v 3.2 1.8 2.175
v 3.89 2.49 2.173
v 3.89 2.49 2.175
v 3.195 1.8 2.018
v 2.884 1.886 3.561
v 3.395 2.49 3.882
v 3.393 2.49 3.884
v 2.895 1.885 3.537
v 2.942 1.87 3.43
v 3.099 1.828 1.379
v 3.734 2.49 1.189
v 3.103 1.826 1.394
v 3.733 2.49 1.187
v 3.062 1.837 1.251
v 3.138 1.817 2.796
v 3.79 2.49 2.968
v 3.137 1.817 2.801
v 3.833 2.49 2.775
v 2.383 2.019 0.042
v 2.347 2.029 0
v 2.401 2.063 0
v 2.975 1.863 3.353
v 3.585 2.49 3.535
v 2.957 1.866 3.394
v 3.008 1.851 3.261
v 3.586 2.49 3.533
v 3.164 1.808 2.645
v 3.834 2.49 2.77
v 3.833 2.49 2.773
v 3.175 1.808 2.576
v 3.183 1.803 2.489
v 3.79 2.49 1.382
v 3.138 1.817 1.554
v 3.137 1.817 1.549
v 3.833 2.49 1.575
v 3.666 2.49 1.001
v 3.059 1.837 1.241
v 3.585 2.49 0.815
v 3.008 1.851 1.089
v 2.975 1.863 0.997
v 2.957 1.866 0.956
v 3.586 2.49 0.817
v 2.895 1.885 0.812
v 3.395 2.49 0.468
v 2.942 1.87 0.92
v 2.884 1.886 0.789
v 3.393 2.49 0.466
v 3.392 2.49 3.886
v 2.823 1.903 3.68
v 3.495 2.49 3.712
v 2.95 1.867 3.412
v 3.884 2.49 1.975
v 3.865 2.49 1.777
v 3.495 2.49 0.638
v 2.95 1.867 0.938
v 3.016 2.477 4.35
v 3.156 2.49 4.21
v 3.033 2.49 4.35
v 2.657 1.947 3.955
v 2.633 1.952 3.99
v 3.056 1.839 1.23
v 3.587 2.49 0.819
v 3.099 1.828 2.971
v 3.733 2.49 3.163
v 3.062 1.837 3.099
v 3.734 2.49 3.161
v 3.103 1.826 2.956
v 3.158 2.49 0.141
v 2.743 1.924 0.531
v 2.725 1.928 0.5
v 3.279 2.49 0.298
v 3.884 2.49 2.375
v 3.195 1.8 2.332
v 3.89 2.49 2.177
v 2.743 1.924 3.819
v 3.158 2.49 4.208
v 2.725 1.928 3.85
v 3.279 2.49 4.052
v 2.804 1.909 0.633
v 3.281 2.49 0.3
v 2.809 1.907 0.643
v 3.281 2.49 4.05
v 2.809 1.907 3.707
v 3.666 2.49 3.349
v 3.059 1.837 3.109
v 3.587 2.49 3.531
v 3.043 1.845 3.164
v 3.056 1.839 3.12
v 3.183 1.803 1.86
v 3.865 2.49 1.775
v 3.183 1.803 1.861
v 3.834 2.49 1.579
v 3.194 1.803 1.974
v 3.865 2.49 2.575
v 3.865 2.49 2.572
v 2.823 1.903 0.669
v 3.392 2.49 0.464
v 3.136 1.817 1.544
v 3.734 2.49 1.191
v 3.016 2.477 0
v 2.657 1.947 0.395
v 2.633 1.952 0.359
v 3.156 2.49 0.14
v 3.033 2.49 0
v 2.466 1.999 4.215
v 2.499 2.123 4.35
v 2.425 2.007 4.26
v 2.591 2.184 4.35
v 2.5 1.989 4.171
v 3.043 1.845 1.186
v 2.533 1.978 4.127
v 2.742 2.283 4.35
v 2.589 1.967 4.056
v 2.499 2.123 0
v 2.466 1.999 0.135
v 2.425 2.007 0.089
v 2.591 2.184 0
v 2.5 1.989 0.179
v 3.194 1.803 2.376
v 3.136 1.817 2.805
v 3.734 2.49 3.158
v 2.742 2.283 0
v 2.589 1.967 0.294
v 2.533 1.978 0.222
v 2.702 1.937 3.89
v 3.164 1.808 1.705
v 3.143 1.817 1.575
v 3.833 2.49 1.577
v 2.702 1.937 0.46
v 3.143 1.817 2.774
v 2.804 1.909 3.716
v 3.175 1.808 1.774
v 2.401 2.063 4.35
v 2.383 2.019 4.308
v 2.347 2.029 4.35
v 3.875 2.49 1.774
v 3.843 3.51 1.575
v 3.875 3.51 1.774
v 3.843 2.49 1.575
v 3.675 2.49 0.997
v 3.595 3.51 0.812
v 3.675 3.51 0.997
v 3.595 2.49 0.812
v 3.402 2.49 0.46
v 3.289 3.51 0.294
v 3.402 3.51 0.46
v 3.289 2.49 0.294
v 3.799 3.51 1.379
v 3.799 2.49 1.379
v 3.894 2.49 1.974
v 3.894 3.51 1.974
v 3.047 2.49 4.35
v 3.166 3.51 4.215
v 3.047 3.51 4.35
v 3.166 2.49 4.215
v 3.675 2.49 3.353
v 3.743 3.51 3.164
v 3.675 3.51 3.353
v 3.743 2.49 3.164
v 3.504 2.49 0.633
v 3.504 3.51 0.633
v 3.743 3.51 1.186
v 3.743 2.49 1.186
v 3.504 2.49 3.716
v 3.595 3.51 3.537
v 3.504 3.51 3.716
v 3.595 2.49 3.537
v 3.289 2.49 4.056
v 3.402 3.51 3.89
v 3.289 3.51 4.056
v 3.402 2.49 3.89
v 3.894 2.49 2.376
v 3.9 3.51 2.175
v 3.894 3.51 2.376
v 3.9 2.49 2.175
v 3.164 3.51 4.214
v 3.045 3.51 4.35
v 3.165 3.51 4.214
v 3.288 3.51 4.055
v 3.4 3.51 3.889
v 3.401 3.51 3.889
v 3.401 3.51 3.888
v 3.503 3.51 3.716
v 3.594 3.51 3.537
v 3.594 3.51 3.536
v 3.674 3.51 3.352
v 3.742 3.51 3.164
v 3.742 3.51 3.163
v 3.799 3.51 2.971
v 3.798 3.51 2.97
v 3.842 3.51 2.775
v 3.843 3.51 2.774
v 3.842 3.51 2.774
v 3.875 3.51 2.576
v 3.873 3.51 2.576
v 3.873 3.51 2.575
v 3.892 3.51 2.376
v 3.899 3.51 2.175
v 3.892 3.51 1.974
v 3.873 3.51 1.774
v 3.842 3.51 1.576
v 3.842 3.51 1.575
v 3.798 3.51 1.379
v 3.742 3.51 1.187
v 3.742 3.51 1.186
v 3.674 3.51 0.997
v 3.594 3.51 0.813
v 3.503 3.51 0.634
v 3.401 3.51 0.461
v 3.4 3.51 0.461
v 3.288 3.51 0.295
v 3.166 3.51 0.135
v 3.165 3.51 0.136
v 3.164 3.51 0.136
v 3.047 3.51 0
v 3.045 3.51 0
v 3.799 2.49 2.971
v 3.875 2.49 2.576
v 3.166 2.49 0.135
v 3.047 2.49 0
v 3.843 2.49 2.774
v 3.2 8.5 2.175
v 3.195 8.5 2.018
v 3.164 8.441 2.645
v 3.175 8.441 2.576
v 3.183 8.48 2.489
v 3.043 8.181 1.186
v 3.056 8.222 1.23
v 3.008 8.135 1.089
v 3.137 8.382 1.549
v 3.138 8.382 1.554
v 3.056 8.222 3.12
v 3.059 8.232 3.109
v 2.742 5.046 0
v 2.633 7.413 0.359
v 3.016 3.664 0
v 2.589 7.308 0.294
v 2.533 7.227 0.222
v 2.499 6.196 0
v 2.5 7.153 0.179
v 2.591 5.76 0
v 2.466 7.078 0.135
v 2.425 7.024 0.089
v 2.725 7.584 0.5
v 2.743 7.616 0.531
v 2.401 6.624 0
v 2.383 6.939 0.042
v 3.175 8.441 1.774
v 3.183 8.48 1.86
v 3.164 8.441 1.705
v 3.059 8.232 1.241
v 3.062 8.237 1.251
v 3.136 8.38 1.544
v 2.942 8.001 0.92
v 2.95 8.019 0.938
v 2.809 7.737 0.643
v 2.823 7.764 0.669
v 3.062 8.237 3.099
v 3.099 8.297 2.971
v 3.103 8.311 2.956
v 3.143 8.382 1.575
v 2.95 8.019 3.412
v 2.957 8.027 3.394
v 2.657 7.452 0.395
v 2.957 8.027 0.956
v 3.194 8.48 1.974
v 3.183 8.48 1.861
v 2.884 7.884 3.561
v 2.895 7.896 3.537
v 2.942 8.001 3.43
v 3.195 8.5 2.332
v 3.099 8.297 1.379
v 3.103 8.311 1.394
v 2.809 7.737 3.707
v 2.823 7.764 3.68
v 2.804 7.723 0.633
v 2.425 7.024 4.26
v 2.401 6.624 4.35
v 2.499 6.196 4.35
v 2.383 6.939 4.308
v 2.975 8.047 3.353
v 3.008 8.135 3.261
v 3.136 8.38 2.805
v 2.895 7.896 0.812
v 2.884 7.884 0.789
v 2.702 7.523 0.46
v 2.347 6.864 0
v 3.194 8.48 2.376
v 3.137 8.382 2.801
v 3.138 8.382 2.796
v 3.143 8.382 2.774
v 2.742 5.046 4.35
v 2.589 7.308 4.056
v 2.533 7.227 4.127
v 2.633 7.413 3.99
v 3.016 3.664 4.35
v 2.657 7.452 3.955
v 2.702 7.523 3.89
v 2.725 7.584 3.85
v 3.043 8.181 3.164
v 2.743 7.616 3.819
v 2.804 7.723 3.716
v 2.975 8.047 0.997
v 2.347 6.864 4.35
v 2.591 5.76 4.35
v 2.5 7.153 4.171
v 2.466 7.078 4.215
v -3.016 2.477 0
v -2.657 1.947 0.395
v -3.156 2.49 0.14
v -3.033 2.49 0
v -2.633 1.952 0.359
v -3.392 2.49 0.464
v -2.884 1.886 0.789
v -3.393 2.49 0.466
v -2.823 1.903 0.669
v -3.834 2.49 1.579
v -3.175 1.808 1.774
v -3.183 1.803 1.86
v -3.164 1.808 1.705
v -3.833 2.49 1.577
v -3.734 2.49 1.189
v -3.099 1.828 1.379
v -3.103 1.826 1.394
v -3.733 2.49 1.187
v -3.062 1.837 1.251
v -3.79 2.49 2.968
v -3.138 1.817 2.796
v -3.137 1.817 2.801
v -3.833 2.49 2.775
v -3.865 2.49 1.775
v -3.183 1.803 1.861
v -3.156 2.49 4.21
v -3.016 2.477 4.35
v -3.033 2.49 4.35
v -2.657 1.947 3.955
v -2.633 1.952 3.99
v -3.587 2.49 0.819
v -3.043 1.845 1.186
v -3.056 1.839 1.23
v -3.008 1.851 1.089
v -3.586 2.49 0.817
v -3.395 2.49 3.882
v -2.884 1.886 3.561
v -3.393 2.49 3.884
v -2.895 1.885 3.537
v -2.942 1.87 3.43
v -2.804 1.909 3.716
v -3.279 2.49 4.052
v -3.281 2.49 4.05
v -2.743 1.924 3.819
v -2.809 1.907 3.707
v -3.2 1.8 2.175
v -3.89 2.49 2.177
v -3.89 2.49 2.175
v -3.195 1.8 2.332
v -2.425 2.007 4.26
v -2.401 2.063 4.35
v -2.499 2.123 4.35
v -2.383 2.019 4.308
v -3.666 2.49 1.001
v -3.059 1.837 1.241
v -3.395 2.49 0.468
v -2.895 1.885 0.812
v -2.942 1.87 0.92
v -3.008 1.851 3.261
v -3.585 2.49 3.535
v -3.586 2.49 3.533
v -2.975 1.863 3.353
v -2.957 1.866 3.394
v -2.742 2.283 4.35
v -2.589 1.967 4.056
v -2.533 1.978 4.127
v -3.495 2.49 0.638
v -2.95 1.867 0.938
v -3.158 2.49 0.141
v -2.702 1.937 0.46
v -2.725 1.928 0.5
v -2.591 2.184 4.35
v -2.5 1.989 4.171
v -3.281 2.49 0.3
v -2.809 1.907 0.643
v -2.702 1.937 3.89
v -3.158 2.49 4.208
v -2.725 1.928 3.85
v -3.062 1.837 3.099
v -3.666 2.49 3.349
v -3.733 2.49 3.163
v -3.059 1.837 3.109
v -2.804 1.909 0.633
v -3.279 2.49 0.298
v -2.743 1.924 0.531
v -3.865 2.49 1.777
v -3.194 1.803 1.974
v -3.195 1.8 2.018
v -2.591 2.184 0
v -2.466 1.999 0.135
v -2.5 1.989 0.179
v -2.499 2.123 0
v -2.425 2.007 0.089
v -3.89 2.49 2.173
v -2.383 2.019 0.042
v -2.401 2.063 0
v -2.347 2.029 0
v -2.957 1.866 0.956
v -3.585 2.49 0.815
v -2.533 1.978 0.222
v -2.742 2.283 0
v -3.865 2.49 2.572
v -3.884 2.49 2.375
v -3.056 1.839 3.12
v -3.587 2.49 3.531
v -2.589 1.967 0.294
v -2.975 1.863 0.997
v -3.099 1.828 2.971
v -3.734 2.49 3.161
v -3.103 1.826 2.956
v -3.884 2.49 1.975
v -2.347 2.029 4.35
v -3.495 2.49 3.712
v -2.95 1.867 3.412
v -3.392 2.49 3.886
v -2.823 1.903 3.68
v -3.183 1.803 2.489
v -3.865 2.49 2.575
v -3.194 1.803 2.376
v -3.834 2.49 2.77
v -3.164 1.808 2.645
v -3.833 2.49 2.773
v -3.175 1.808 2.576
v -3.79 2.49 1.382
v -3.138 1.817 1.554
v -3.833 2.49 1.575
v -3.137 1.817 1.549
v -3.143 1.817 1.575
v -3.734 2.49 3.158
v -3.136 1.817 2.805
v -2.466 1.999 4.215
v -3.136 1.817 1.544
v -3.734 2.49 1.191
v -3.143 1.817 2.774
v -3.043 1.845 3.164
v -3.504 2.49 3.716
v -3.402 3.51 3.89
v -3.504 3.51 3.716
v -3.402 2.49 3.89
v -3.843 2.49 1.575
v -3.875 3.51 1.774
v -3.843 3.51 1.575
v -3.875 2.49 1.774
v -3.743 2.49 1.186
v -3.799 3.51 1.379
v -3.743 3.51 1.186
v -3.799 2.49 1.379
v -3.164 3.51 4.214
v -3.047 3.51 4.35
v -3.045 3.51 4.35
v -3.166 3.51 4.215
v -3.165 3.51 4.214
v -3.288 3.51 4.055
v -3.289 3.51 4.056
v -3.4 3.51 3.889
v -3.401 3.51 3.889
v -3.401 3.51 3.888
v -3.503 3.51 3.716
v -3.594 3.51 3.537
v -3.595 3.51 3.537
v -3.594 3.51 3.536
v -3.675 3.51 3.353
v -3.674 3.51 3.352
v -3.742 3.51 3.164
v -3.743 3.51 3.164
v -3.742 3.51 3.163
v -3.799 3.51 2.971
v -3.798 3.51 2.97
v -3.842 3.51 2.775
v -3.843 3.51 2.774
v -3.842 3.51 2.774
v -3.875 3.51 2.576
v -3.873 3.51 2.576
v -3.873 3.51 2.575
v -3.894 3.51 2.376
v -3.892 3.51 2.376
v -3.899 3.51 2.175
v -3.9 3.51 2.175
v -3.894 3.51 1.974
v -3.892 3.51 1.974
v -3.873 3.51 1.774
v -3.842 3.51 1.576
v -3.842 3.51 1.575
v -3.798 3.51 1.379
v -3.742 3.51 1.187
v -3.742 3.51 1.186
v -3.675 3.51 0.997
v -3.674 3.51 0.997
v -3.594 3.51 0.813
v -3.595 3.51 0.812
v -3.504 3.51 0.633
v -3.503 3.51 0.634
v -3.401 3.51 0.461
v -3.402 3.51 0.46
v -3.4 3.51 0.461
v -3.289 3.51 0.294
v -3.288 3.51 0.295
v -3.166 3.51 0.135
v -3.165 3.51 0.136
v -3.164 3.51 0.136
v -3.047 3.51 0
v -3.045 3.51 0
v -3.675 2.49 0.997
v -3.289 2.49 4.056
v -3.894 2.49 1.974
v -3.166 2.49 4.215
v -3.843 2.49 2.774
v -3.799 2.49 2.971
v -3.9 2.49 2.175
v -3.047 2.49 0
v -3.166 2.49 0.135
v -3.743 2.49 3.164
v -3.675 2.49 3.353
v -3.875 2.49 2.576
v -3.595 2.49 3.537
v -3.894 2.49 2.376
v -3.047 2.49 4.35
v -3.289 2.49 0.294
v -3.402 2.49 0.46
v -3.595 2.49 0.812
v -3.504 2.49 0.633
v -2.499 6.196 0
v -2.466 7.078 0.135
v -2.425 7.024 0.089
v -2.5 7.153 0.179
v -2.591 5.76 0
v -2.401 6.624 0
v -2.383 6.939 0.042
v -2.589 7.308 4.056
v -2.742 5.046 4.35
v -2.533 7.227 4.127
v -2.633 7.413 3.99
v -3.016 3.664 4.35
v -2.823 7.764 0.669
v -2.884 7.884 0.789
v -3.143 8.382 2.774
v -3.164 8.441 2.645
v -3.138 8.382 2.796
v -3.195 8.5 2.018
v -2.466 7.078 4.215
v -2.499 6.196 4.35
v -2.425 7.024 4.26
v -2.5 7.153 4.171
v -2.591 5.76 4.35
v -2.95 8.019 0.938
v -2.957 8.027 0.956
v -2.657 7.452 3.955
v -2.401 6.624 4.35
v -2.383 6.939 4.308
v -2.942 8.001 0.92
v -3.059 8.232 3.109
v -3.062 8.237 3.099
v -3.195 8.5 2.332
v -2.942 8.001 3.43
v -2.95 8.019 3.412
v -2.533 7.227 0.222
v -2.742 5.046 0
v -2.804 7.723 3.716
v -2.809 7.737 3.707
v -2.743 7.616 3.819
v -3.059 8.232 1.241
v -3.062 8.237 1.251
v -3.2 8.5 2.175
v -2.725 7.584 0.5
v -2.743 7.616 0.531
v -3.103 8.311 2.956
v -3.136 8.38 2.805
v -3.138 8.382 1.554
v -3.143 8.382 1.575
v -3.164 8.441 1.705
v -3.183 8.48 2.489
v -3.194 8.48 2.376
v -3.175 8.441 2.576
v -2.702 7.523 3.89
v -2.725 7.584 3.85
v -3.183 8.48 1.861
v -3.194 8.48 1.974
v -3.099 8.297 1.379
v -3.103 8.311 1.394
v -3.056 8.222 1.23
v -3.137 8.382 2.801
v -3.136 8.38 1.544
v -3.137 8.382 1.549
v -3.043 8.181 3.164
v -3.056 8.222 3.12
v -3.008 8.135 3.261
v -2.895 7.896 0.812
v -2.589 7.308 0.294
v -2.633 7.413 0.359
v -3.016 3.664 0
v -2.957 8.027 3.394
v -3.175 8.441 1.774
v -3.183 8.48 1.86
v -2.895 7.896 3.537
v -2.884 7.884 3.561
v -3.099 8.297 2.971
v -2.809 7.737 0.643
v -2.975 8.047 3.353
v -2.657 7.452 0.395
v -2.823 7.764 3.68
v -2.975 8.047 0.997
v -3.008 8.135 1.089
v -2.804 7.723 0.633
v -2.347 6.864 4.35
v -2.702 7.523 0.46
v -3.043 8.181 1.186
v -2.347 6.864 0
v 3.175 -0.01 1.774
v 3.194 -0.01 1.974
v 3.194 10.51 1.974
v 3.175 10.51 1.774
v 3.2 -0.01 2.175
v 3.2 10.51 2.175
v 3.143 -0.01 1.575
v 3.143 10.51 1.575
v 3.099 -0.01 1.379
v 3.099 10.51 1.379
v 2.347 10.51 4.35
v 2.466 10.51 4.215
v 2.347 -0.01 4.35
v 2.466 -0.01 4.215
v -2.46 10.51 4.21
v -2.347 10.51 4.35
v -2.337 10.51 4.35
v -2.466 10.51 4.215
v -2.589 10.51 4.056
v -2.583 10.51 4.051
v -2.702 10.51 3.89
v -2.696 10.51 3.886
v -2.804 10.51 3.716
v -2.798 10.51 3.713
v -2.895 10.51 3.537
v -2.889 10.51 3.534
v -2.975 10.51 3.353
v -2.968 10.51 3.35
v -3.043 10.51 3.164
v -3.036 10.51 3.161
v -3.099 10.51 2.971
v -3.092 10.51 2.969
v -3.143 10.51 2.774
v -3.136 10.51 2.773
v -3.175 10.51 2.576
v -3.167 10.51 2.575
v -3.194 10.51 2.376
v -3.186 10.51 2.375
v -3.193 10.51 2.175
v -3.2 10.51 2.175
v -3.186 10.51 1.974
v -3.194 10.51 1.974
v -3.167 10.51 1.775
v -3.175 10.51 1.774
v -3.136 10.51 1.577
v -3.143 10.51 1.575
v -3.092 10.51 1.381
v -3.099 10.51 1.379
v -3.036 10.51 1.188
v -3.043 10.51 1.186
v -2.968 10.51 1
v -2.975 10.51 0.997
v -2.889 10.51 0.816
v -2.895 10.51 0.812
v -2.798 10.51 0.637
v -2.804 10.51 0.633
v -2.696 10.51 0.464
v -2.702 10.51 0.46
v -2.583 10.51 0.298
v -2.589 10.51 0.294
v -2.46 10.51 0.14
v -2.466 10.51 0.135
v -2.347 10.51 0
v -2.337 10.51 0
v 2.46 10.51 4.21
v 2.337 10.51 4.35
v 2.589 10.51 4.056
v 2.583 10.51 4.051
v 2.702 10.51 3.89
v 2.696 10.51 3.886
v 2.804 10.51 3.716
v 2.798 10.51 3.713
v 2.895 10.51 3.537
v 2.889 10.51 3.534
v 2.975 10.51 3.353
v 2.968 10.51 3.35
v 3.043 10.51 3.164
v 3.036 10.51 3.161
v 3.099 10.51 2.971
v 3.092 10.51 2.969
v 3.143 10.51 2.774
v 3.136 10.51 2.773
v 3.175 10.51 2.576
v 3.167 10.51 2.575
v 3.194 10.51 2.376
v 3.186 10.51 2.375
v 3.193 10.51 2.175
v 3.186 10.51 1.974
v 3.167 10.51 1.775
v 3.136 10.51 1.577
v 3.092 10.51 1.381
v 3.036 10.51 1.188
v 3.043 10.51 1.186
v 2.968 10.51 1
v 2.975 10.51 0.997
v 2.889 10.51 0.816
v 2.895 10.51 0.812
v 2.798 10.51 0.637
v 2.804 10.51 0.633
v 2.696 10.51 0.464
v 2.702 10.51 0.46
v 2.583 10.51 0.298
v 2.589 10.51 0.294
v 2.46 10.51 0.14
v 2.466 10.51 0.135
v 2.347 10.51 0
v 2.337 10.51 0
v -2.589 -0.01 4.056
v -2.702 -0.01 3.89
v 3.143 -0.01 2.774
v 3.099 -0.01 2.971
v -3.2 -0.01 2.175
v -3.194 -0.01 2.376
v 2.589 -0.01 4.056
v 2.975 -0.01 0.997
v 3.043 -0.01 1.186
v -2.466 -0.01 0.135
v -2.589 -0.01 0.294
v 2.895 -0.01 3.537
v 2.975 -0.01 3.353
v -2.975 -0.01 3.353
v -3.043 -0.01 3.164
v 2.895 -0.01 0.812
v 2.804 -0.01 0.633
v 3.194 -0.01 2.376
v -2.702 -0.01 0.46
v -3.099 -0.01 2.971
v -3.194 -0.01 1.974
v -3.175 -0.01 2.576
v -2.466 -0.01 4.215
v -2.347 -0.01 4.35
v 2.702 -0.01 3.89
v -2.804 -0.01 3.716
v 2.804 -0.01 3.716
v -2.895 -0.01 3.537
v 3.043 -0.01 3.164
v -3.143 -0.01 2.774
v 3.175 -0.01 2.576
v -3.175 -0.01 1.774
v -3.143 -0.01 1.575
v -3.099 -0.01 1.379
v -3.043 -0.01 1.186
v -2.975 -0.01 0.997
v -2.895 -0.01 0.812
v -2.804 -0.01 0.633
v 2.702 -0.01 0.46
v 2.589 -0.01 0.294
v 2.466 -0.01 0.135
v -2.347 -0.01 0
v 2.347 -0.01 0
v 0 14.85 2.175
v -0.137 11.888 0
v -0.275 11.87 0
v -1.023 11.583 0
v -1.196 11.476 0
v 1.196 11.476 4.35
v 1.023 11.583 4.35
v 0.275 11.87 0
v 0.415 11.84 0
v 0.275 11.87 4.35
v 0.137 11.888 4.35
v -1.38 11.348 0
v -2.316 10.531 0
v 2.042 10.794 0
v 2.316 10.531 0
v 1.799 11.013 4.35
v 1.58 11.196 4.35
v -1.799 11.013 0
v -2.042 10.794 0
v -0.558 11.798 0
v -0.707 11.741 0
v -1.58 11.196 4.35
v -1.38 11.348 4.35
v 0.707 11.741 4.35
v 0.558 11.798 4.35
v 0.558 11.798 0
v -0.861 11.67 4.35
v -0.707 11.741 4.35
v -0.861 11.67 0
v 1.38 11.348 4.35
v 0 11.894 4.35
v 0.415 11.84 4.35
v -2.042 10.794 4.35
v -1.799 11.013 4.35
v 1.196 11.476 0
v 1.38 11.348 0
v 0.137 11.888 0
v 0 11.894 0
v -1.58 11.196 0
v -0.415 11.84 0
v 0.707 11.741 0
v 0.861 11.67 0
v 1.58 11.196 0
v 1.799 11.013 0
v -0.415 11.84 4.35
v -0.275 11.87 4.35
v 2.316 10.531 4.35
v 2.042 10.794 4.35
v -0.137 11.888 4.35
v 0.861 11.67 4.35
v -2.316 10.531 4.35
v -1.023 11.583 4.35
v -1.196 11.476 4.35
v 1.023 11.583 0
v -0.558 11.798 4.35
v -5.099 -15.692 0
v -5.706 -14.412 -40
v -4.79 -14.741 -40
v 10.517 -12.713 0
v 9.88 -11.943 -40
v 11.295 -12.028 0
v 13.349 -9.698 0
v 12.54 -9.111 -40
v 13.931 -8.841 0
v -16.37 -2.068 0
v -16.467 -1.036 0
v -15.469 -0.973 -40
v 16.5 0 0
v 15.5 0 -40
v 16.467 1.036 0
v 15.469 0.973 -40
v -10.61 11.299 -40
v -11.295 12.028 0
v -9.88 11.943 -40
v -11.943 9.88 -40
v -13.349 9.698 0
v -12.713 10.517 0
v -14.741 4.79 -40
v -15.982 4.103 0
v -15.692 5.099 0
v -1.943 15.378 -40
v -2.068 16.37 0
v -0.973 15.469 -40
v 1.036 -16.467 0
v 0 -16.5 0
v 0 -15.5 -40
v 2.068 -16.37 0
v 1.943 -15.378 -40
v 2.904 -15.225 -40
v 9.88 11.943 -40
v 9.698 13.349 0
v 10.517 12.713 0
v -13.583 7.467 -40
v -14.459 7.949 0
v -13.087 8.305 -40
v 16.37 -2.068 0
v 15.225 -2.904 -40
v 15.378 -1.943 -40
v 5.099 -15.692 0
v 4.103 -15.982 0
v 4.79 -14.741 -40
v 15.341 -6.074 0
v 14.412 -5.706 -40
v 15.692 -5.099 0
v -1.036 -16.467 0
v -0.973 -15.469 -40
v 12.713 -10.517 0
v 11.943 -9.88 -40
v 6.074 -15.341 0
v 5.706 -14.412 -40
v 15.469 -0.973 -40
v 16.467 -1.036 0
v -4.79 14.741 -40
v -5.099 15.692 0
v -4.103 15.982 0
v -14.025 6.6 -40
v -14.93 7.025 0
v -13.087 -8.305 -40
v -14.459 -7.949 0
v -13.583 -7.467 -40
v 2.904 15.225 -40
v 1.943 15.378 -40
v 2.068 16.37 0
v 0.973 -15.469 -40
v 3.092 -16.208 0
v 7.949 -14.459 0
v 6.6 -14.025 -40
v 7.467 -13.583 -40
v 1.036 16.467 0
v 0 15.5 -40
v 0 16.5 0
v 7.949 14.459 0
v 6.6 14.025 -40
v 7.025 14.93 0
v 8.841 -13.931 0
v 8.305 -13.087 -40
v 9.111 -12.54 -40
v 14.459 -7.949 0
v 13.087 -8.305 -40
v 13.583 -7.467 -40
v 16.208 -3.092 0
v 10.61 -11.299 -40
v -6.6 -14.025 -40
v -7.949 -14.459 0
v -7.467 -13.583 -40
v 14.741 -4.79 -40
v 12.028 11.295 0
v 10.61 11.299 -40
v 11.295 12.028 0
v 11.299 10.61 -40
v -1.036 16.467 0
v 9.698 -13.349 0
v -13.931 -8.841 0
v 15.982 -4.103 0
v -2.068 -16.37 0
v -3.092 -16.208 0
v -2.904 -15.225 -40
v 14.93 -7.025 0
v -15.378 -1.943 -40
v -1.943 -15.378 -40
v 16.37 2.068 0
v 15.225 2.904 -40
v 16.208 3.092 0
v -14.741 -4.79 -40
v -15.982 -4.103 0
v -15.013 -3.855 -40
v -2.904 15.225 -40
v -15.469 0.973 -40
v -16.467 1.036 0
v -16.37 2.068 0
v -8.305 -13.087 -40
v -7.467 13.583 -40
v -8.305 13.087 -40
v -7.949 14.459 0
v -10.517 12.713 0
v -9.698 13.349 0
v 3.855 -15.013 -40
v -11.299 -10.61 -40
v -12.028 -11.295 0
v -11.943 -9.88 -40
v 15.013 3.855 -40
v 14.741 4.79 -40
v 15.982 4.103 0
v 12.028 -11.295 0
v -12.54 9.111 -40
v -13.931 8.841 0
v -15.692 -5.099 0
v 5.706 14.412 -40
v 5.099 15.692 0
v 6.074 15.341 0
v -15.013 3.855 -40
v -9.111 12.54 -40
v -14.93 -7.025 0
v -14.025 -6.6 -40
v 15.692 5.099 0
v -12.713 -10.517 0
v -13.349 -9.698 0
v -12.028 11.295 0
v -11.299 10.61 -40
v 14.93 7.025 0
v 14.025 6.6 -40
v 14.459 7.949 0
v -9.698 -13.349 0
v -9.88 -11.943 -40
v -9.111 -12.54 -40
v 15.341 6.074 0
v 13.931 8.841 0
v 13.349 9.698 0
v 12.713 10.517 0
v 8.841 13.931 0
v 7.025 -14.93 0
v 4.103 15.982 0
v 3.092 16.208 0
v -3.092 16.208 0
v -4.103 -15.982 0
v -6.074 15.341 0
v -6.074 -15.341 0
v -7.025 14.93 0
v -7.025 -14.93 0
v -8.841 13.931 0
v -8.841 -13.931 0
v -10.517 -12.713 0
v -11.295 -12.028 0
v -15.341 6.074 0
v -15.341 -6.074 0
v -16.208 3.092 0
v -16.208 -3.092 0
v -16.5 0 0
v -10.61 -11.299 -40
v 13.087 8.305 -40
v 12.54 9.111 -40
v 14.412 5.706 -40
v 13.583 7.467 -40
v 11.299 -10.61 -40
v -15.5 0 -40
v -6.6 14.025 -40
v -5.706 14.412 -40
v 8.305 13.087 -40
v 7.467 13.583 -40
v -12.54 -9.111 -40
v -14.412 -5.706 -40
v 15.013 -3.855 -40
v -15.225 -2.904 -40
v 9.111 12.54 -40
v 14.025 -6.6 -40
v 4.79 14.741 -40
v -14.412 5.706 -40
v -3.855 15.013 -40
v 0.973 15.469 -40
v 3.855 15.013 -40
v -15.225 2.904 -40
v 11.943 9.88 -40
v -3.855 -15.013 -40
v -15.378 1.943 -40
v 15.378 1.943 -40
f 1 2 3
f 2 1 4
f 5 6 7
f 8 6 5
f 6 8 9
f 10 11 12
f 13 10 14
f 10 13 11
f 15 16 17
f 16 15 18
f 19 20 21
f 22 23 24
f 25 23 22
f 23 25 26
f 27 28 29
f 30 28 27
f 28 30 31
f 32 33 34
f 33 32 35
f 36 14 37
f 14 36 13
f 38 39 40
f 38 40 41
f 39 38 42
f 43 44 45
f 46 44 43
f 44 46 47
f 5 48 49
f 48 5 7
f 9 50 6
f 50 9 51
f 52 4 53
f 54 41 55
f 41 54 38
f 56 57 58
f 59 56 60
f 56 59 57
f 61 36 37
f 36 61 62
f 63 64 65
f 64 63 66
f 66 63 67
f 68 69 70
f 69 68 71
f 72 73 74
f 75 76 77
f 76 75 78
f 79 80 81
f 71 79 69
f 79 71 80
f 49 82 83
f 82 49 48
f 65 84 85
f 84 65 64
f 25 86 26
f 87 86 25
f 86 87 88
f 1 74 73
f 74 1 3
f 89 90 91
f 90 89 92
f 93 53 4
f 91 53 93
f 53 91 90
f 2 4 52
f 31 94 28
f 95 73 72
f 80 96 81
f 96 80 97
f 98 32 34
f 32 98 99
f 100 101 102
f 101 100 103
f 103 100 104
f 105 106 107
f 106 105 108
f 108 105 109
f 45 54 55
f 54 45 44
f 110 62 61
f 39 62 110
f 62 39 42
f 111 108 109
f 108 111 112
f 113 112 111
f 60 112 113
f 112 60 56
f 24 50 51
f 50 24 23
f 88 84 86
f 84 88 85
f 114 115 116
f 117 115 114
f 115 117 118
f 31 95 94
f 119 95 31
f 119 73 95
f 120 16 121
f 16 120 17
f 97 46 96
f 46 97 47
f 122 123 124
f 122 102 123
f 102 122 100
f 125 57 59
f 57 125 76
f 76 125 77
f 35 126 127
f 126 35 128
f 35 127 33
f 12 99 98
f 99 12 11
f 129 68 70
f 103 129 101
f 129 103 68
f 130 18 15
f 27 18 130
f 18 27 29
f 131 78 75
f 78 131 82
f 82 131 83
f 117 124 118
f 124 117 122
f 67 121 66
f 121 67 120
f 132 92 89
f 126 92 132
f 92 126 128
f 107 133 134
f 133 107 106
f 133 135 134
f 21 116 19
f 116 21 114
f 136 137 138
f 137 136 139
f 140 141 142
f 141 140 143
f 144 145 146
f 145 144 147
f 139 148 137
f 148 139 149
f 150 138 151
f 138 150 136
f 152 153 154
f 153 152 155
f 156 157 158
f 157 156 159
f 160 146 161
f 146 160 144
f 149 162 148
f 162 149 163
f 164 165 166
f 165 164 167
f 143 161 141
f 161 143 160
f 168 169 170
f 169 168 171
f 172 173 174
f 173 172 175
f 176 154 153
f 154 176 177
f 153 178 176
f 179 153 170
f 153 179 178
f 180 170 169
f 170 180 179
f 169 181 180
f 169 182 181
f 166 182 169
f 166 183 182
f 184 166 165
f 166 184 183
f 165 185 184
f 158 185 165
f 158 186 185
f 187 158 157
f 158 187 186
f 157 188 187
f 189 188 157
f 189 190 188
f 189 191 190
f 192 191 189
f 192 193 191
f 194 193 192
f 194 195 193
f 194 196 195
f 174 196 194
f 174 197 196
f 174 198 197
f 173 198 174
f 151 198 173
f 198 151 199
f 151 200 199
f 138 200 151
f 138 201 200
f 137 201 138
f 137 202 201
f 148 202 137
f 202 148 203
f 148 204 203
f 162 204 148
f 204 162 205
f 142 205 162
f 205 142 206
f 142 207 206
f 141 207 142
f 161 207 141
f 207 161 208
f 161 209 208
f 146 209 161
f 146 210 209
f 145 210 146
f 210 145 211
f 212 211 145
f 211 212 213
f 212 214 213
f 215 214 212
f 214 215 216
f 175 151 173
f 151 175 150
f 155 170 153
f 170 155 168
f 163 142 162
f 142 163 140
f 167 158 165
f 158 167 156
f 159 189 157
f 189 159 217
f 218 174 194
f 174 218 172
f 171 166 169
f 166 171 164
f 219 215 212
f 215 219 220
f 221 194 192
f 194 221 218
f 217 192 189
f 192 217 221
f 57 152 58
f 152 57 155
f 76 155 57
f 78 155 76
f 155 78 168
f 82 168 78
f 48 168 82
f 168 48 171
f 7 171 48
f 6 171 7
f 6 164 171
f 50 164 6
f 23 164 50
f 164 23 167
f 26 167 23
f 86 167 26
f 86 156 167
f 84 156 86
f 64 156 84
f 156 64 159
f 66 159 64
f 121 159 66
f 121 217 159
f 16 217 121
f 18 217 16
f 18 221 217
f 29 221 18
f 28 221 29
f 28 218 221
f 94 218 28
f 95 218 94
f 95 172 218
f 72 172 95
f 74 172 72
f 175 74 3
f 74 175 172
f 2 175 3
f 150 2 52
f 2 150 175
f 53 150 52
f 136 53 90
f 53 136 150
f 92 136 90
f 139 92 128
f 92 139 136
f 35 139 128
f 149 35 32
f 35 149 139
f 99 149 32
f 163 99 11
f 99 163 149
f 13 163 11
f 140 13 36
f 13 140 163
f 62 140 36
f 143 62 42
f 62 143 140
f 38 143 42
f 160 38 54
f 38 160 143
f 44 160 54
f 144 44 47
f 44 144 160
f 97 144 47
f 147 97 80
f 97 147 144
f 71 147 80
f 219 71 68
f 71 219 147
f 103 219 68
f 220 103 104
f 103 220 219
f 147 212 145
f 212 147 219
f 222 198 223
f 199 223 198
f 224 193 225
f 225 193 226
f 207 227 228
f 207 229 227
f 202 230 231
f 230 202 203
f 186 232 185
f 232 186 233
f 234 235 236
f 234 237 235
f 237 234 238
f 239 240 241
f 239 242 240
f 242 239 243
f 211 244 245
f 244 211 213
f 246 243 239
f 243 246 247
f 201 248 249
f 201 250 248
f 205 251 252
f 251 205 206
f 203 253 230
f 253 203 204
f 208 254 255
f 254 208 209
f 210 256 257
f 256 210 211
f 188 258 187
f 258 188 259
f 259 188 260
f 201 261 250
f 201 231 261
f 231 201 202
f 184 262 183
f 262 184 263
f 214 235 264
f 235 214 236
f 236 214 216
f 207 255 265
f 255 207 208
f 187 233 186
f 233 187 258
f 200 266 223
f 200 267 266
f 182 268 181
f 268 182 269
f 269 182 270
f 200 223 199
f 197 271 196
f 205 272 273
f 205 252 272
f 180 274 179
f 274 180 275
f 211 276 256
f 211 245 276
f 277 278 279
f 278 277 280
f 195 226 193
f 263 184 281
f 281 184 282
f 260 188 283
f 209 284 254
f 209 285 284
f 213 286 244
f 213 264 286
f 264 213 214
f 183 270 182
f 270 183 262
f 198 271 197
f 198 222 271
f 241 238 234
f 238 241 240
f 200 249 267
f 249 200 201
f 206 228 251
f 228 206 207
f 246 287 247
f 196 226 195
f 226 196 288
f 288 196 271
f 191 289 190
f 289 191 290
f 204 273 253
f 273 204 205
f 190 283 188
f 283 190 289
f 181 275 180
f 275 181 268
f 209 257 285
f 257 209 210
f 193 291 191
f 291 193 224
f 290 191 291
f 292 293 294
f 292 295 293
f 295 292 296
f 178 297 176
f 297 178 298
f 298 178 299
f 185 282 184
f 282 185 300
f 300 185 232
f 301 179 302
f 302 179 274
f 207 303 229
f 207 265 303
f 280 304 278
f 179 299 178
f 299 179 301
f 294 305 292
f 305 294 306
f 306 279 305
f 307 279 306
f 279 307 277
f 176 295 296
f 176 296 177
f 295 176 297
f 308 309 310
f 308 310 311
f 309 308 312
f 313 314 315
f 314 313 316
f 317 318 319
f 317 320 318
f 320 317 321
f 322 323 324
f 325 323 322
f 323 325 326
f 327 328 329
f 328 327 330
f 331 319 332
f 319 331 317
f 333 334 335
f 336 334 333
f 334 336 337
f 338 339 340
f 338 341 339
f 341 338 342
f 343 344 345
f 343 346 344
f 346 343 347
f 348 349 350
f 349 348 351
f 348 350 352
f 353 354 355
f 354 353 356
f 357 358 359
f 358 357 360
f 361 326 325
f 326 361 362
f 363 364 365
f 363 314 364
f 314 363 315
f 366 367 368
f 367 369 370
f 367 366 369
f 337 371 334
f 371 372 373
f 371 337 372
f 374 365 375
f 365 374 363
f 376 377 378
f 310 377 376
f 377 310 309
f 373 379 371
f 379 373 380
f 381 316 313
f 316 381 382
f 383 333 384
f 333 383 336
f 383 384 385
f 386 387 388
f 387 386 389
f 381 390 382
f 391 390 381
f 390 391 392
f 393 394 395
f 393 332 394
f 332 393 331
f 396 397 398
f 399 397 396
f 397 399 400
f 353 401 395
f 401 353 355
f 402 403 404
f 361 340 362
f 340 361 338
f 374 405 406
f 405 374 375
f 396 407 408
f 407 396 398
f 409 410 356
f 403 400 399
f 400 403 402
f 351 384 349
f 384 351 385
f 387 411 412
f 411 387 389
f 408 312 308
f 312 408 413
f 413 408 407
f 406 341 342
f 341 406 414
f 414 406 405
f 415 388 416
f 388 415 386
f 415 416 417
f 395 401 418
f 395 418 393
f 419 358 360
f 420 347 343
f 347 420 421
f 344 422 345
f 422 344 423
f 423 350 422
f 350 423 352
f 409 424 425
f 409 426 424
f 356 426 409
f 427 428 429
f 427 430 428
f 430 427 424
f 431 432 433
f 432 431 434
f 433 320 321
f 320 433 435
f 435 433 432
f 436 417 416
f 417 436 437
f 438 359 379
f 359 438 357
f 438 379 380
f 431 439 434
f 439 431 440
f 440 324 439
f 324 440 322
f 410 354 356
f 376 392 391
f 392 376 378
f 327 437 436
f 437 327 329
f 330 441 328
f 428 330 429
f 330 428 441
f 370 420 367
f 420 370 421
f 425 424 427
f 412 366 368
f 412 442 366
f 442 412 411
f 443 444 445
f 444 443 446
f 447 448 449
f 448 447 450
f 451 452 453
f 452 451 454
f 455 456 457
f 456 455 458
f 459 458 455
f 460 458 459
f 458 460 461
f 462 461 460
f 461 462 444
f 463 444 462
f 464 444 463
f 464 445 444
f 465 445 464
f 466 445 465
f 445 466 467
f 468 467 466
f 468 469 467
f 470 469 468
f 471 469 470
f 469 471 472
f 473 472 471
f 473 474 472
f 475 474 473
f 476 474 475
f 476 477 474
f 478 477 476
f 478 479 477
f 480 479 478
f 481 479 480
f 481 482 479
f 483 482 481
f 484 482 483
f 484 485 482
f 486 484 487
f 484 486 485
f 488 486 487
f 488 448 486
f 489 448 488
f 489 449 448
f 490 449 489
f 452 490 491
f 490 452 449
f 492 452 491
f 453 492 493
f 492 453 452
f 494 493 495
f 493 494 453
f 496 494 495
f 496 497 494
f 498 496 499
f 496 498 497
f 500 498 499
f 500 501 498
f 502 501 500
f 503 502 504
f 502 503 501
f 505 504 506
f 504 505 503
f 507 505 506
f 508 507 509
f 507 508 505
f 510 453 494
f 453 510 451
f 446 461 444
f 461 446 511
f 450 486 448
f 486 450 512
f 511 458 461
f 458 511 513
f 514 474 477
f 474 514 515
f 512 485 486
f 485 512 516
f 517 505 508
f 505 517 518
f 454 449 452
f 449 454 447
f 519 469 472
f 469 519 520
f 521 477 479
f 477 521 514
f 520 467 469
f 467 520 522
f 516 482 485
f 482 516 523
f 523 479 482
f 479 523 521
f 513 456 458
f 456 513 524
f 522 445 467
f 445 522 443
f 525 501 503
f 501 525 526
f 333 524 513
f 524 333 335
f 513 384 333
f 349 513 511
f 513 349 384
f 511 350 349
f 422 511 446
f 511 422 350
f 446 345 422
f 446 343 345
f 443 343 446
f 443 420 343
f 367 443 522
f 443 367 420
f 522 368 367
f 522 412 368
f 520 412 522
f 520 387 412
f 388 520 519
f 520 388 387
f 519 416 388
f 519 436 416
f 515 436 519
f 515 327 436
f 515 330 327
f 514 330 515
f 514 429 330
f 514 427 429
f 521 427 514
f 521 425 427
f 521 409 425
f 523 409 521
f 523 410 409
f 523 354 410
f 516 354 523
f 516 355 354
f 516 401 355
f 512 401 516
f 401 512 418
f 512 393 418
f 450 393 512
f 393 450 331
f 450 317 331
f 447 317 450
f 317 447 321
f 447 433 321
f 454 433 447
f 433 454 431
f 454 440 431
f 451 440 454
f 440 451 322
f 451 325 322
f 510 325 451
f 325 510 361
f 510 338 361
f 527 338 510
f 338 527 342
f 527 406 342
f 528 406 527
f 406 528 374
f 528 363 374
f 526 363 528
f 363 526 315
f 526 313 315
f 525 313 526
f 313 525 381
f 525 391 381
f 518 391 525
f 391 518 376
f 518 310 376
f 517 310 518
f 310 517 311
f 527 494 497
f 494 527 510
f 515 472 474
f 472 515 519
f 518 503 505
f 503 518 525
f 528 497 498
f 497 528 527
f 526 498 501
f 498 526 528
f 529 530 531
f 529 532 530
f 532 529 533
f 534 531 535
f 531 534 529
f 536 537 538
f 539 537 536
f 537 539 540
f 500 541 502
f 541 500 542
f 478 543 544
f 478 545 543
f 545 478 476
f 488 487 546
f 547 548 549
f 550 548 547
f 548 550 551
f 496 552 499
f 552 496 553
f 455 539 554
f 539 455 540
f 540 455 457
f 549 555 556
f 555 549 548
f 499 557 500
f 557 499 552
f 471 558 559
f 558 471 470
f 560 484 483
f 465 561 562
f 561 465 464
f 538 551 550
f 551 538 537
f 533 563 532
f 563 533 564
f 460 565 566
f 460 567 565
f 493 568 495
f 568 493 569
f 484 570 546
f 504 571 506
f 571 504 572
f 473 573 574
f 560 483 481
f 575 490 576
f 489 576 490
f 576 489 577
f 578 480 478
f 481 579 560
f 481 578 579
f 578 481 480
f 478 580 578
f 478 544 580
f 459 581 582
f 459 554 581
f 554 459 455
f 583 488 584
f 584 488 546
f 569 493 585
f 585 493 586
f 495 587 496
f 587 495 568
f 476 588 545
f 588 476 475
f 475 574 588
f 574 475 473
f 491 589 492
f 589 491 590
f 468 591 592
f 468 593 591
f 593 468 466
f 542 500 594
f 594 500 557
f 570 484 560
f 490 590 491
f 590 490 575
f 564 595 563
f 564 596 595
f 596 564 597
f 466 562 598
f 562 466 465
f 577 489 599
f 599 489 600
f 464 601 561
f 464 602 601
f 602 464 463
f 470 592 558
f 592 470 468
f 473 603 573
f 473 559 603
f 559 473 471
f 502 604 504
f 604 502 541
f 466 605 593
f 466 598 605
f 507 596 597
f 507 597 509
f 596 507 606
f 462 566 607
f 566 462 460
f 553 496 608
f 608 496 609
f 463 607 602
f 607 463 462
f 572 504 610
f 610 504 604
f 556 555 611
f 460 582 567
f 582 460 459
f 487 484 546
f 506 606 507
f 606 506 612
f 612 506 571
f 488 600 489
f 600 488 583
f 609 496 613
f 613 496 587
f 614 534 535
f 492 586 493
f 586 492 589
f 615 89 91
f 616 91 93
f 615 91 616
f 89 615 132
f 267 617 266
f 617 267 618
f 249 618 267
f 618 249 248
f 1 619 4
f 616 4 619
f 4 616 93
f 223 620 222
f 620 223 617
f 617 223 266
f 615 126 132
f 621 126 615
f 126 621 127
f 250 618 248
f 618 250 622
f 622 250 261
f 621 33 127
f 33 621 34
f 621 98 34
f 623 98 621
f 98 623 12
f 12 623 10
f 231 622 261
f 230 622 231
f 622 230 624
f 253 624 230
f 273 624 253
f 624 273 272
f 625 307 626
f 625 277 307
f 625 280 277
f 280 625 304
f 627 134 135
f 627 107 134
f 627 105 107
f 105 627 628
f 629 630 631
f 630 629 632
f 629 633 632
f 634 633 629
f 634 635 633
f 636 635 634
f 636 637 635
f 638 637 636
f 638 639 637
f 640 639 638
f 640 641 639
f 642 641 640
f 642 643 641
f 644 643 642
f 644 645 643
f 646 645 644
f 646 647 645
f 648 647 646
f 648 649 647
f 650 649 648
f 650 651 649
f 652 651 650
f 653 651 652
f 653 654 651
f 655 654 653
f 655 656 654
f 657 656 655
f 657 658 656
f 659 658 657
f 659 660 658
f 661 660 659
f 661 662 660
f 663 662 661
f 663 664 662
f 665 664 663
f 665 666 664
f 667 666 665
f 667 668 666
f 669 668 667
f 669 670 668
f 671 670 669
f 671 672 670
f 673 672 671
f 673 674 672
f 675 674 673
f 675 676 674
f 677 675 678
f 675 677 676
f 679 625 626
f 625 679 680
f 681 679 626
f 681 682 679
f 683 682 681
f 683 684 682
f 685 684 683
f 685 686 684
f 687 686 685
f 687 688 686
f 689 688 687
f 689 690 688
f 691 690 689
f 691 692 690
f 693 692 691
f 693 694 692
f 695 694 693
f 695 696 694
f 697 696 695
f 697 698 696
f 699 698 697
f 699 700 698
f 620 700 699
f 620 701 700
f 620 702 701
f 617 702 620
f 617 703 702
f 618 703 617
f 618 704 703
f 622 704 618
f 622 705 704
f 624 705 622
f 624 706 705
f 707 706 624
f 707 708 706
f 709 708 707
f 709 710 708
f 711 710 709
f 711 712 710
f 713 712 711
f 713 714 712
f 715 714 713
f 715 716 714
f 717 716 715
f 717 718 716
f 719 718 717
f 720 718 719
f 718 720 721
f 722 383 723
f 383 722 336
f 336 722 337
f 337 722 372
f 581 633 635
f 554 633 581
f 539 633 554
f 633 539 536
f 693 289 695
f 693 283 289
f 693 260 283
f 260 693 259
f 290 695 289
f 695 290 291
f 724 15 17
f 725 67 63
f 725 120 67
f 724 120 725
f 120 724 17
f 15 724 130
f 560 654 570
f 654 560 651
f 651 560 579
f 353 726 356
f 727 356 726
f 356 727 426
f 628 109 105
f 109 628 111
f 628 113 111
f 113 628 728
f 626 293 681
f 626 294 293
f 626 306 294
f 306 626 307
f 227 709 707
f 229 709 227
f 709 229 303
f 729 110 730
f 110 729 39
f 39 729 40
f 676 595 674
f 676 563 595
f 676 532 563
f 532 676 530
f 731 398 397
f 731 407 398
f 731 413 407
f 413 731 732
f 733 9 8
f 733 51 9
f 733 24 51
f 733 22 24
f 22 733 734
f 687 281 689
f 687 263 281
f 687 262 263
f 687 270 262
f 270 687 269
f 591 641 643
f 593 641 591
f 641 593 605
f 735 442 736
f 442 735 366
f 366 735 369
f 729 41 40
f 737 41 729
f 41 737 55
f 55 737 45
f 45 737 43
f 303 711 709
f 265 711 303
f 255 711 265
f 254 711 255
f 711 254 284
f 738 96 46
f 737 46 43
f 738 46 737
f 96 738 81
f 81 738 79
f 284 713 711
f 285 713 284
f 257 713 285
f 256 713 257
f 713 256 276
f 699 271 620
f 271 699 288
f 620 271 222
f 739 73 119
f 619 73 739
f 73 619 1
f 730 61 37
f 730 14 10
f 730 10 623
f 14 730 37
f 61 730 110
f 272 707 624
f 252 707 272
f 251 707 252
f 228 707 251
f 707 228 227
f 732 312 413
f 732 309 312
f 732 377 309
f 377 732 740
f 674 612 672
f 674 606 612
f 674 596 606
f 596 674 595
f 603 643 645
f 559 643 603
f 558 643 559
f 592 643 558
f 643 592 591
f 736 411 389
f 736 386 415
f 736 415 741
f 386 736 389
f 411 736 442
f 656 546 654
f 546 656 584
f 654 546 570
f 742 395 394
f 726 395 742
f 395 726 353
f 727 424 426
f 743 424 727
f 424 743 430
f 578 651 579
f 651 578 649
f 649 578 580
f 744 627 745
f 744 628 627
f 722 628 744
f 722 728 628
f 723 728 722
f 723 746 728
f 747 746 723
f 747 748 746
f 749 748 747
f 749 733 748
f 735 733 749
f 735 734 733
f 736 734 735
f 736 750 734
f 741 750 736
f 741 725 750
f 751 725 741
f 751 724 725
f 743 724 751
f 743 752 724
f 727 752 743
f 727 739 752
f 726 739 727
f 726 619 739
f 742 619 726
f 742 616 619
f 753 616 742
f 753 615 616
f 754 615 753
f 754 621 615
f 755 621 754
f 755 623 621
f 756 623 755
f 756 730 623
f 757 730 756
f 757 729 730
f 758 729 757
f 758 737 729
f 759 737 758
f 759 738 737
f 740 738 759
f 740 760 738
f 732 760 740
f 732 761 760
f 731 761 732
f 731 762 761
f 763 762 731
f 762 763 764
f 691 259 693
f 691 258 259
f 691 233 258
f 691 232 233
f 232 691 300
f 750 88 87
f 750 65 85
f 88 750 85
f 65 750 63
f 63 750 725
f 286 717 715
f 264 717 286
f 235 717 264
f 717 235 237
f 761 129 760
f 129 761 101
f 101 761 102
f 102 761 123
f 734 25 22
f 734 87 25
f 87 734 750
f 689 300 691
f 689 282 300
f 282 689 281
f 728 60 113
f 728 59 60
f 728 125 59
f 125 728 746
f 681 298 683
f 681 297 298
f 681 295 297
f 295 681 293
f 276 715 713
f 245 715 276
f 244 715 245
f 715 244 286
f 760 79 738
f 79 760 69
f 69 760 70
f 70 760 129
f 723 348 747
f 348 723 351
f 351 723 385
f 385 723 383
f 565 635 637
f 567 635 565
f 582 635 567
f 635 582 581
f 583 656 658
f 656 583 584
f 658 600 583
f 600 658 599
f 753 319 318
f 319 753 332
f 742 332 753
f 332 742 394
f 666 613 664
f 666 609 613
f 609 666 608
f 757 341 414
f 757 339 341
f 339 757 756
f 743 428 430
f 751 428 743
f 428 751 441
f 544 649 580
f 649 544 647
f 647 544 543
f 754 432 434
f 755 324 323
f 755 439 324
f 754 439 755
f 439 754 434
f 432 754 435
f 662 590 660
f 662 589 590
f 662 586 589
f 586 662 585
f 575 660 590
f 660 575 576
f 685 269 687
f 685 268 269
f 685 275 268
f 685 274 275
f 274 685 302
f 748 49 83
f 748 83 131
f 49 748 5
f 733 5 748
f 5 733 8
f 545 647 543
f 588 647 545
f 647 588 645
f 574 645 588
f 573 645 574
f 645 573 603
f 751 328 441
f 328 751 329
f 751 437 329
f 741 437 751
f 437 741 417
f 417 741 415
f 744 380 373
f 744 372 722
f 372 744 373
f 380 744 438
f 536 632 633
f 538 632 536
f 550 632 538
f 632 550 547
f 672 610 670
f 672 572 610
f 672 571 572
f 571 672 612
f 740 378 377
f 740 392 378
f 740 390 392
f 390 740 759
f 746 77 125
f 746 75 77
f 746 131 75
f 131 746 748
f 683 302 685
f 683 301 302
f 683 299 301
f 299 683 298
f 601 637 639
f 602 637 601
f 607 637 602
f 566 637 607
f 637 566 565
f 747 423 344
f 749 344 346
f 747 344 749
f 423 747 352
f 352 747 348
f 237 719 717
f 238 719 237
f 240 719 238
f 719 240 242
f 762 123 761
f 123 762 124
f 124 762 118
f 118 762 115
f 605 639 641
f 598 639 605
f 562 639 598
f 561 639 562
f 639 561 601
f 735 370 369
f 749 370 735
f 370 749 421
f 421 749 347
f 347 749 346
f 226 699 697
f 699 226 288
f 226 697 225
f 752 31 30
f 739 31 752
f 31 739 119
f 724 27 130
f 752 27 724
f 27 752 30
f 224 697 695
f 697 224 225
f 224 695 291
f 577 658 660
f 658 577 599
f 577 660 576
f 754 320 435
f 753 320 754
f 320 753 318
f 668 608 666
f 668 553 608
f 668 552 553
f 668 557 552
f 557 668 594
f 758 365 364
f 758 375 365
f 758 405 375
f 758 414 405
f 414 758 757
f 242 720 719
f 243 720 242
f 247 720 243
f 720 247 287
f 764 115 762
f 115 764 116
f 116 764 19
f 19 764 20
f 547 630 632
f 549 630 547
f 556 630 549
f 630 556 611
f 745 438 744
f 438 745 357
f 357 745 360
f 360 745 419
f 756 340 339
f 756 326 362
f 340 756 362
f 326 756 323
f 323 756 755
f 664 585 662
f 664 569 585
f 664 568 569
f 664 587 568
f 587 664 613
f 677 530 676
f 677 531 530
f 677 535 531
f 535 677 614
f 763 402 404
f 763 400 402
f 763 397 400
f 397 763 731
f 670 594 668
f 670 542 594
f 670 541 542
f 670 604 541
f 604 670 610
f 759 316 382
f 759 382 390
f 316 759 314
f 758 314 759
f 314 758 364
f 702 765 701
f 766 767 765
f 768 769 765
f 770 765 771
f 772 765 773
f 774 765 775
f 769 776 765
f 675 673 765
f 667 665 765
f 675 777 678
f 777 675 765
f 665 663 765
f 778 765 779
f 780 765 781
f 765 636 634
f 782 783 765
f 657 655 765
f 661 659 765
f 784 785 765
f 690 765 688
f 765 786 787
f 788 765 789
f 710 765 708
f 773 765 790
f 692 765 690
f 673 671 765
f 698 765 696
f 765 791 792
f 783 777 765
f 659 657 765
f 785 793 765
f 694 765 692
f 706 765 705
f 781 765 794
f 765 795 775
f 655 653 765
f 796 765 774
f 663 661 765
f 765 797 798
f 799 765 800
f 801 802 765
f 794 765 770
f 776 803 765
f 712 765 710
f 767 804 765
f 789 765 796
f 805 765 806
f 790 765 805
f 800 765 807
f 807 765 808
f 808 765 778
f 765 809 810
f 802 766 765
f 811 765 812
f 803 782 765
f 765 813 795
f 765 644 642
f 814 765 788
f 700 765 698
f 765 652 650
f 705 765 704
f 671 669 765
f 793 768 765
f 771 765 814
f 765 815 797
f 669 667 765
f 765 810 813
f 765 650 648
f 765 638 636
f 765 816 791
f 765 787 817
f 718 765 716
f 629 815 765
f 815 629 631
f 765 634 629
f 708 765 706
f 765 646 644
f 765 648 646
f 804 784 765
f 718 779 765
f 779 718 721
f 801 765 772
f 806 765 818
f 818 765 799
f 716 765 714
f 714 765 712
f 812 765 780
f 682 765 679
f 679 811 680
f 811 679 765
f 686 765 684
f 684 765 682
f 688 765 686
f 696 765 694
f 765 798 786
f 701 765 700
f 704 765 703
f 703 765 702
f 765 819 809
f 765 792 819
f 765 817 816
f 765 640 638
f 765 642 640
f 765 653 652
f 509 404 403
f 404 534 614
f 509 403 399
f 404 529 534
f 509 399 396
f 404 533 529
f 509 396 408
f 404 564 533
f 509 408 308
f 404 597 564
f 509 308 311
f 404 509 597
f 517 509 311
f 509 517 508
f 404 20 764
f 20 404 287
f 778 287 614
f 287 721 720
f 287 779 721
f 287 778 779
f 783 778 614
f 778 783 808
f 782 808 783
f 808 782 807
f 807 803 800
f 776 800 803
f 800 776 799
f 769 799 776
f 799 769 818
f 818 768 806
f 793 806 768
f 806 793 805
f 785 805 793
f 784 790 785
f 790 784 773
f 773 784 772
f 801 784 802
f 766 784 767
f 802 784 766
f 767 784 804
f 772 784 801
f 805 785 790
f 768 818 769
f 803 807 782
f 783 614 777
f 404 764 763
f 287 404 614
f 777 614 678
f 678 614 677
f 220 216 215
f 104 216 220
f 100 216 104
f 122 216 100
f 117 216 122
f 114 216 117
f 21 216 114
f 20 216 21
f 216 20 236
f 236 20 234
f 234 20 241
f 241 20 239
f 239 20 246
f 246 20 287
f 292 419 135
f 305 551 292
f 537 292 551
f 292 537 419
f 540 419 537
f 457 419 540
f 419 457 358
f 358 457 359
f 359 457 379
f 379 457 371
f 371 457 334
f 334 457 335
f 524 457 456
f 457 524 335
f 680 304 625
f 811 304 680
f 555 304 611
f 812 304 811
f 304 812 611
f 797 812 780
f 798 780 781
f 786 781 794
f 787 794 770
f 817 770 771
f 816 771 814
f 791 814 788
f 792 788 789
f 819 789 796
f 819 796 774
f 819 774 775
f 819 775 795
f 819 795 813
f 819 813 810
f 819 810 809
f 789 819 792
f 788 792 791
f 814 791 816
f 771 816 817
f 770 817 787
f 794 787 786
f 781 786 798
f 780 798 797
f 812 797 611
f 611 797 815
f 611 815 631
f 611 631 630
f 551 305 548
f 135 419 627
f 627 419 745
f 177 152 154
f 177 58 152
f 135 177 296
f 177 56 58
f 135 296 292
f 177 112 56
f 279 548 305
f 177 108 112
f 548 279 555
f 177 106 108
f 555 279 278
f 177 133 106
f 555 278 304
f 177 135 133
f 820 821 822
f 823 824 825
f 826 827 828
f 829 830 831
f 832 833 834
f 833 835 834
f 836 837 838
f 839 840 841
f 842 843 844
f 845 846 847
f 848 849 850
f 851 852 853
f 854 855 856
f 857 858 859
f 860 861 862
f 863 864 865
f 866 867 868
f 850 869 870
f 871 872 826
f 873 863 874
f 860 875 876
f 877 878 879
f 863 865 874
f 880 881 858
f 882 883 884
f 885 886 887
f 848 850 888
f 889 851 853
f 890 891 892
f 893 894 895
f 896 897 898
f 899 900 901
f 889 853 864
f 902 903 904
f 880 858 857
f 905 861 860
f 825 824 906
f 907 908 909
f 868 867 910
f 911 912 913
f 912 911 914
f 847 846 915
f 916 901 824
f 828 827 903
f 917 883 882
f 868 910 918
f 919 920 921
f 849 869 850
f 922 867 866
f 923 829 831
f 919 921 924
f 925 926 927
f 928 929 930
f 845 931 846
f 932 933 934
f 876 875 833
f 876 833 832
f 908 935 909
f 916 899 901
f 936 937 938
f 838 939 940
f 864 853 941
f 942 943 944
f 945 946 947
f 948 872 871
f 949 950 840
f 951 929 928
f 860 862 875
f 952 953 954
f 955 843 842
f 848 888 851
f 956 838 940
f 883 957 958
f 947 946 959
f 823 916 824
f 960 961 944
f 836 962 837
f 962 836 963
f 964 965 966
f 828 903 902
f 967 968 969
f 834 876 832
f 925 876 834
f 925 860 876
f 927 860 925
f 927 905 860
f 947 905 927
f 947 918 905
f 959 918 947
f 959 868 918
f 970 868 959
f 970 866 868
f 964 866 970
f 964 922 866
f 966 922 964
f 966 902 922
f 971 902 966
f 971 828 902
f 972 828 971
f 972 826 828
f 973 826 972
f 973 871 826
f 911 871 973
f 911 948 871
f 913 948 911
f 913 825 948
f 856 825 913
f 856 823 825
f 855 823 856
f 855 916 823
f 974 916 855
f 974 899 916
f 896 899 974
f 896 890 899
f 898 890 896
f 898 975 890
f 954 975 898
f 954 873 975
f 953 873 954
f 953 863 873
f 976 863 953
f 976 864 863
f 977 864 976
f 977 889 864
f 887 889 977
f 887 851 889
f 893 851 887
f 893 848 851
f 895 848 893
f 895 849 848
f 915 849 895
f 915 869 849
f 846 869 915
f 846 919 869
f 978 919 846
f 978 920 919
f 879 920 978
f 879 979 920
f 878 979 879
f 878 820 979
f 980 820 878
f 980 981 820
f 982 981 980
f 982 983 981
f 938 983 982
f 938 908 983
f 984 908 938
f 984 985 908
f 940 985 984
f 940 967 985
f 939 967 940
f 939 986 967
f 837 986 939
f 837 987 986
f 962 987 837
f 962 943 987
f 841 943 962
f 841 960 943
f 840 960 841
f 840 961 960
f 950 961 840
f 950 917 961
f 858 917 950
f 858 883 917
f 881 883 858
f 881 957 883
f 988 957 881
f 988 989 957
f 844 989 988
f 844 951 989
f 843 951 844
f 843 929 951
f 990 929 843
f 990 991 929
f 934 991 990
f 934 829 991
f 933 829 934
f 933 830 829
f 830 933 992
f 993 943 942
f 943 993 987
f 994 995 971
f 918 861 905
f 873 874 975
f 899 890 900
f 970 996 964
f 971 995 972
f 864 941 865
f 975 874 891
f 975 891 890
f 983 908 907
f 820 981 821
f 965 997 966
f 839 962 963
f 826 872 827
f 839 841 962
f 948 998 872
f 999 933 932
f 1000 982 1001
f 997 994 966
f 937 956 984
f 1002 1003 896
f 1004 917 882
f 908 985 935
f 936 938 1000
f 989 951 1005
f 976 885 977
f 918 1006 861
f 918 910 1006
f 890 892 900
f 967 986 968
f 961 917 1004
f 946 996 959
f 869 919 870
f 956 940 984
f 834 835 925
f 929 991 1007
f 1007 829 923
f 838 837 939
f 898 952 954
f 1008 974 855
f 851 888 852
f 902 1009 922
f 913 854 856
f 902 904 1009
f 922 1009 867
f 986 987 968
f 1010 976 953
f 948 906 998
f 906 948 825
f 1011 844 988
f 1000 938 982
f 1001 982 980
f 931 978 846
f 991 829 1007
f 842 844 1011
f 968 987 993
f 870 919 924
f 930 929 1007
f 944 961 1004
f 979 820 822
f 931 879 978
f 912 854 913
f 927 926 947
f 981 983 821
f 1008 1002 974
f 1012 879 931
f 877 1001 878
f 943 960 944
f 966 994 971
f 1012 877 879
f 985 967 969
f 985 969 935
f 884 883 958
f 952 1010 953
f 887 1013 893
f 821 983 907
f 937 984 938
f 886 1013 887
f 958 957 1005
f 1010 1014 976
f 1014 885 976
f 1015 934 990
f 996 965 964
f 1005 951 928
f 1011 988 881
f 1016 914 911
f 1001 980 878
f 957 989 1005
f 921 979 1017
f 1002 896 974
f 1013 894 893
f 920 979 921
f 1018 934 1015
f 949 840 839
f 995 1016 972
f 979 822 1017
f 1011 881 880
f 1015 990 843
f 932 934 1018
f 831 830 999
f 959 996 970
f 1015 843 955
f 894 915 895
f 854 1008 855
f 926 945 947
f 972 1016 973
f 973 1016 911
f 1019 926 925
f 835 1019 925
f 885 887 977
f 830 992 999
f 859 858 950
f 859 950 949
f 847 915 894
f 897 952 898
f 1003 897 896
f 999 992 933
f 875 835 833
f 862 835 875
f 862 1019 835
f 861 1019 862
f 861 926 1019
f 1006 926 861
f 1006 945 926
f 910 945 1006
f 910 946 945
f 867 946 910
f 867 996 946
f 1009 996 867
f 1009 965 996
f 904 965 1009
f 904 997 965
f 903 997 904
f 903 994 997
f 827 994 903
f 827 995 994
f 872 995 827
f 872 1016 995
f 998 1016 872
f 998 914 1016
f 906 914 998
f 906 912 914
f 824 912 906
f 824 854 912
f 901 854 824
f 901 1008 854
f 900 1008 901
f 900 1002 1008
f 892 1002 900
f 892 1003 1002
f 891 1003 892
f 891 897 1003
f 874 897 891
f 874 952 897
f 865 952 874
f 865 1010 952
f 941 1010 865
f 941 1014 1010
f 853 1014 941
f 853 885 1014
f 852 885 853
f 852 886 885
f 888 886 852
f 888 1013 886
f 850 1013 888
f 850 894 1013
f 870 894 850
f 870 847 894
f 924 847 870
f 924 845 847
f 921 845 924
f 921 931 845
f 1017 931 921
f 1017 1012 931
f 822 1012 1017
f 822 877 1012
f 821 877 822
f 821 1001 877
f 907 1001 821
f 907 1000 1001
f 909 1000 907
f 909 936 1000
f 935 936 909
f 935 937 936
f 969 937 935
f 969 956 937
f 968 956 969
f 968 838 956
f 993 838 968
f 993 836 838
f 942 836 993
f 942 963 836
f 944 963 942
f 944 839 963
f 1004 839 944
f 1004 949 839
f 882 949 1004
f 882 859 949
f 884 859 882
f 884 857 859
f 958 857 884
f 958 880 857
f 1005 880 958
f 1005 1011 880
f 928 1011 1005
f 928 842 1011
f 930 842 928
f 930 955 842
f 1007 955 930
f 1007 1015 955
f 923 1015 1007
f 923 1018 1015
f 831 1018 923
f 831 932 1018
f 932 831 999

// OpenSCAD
// file: pin_pegs.scad
// The protuberance that clicks
nub = 0.4;
// The slack/space/tolerance between holes and pegs (very sensitive)
space = 0.3;
// The thickness of the outer layer
thickness = 2.2;
// Radius of the peg
radius = 3.5;
// Length of the peg
size = 15;
// Distance from the base of the peg to the nub
nub_dist = size / 5;
// The length of the hole
slot = (size - radius - space) * 0.9;

// pin(flat=0);
//%pinhole(fixed=true);

// pinpeg();
// translate([10,0,0])difference(){
//	cylinder(r=5.5,h=14);
//	pinhole(fixed=true);
// }
// translate([-10,0,0])difference(){
//	cylinder(r=5.5,h=14);
//	pinhole(fixed=false);
// }

module pin(r = radius, size = size, d = nub_dist, slot = slot, nub = nub, thickness = thickness, space = space, flat = 1) {
    translate(flat * [0, 0, r / sqrt(2) - space]) rotate((1 - flat) * [90, 0, 0]) difference() {
        rotate([-90, 0, 0]) intersection() {
            union() {
                translate([0, 0, -0.01]) cylinder(r = r - space, h = size - r - 0.98);
                translate([0, 0, size - r - 1]) cylinder(r1 = r - space, r2 = 0, h = r - space / 2 + 1);
                translate([nub + space, 0, d]) nub(r - space, nub + space);
                translate([-nub - space, 0, d]) nub(r - space, nub + space);
            }
            cube([3 * r, r * sqrt(2) - 2 * space, 2 * size + 3 * r], center = true);
        }
        translate([0, d, 0]) cube([2 * (r - thickness - space), slot, 2 * r], center = true);
        translate([0, d - slot / 2, 0]) cylinder(r = r - thickness - space, h = 2 * r, center = true, $fn = 12);
        translate([0, d + slot / 2, 0]) cylinder(r = r - thickness - space, h = 2 * r, center = true, $fn = 12);
    }
}

module nub(r, nub) {
    union() {
        translate([0, 0, -nub - 0.5]) cylinder(r1 = r - nub, r2 = r, h = nub);
        cylinder(r = r, h = 1.02, center = true);
        translate([0, 0, 0.5]) cylinder(r1 = r, r2 = r - nub, h = 5);
    }
}
module pinhole(r = radius, size = size, d = nub_dist, nub = nub, fixed = true, fins = true) {
	r = radius + 0.2;
	_size = size + 0.1;
    intersection() {
        union() {
            translate([0, 0, -0.1]) cylinder(r = r, h = _size - r + 0.1);
            translate([0, 0, _size - r - 0.01]) cylinder(r1 = r, r2 = 0, h = r);
            translate([0, 0, d]) nub(r + nub, nub);
            if (fins) translate([0, 0, _size - r]) {
                    cube([2 * r, 0.01, 2 * r], center = true);
                    cube([0.01, 2 * r, 2 * r], center = true);
                }
        }
        if (fixed) cube([3 * r, r * sqrt(2), 2 * _size + 3 * r], center = true);
    }
}

module pinpeg(r = radius, size = size, d = nub_dist, nub = nub, thickness = thickness, space = space) {
    union() {
        pin(r = r, size = size, d = d, nub = nub, thickness = thickness, space = space, flat = 1);
        mirror([0, 1, 0]) pin(r = r, size = size, d = d, nub = nub, t = t, space = space, flat = 1);
    }
}
// main file
include <pin_pegs.scad>

dia=33;
height=40;
hole=12;
$fn=100;

translate([0, 0, -height/2]) {
    cylinder(r=dia/2-1, r2=dia/2,h=height, center=true);
}
    pin(radius=hole/2,length=8,nub_size=0.6,thickness=3.5);
